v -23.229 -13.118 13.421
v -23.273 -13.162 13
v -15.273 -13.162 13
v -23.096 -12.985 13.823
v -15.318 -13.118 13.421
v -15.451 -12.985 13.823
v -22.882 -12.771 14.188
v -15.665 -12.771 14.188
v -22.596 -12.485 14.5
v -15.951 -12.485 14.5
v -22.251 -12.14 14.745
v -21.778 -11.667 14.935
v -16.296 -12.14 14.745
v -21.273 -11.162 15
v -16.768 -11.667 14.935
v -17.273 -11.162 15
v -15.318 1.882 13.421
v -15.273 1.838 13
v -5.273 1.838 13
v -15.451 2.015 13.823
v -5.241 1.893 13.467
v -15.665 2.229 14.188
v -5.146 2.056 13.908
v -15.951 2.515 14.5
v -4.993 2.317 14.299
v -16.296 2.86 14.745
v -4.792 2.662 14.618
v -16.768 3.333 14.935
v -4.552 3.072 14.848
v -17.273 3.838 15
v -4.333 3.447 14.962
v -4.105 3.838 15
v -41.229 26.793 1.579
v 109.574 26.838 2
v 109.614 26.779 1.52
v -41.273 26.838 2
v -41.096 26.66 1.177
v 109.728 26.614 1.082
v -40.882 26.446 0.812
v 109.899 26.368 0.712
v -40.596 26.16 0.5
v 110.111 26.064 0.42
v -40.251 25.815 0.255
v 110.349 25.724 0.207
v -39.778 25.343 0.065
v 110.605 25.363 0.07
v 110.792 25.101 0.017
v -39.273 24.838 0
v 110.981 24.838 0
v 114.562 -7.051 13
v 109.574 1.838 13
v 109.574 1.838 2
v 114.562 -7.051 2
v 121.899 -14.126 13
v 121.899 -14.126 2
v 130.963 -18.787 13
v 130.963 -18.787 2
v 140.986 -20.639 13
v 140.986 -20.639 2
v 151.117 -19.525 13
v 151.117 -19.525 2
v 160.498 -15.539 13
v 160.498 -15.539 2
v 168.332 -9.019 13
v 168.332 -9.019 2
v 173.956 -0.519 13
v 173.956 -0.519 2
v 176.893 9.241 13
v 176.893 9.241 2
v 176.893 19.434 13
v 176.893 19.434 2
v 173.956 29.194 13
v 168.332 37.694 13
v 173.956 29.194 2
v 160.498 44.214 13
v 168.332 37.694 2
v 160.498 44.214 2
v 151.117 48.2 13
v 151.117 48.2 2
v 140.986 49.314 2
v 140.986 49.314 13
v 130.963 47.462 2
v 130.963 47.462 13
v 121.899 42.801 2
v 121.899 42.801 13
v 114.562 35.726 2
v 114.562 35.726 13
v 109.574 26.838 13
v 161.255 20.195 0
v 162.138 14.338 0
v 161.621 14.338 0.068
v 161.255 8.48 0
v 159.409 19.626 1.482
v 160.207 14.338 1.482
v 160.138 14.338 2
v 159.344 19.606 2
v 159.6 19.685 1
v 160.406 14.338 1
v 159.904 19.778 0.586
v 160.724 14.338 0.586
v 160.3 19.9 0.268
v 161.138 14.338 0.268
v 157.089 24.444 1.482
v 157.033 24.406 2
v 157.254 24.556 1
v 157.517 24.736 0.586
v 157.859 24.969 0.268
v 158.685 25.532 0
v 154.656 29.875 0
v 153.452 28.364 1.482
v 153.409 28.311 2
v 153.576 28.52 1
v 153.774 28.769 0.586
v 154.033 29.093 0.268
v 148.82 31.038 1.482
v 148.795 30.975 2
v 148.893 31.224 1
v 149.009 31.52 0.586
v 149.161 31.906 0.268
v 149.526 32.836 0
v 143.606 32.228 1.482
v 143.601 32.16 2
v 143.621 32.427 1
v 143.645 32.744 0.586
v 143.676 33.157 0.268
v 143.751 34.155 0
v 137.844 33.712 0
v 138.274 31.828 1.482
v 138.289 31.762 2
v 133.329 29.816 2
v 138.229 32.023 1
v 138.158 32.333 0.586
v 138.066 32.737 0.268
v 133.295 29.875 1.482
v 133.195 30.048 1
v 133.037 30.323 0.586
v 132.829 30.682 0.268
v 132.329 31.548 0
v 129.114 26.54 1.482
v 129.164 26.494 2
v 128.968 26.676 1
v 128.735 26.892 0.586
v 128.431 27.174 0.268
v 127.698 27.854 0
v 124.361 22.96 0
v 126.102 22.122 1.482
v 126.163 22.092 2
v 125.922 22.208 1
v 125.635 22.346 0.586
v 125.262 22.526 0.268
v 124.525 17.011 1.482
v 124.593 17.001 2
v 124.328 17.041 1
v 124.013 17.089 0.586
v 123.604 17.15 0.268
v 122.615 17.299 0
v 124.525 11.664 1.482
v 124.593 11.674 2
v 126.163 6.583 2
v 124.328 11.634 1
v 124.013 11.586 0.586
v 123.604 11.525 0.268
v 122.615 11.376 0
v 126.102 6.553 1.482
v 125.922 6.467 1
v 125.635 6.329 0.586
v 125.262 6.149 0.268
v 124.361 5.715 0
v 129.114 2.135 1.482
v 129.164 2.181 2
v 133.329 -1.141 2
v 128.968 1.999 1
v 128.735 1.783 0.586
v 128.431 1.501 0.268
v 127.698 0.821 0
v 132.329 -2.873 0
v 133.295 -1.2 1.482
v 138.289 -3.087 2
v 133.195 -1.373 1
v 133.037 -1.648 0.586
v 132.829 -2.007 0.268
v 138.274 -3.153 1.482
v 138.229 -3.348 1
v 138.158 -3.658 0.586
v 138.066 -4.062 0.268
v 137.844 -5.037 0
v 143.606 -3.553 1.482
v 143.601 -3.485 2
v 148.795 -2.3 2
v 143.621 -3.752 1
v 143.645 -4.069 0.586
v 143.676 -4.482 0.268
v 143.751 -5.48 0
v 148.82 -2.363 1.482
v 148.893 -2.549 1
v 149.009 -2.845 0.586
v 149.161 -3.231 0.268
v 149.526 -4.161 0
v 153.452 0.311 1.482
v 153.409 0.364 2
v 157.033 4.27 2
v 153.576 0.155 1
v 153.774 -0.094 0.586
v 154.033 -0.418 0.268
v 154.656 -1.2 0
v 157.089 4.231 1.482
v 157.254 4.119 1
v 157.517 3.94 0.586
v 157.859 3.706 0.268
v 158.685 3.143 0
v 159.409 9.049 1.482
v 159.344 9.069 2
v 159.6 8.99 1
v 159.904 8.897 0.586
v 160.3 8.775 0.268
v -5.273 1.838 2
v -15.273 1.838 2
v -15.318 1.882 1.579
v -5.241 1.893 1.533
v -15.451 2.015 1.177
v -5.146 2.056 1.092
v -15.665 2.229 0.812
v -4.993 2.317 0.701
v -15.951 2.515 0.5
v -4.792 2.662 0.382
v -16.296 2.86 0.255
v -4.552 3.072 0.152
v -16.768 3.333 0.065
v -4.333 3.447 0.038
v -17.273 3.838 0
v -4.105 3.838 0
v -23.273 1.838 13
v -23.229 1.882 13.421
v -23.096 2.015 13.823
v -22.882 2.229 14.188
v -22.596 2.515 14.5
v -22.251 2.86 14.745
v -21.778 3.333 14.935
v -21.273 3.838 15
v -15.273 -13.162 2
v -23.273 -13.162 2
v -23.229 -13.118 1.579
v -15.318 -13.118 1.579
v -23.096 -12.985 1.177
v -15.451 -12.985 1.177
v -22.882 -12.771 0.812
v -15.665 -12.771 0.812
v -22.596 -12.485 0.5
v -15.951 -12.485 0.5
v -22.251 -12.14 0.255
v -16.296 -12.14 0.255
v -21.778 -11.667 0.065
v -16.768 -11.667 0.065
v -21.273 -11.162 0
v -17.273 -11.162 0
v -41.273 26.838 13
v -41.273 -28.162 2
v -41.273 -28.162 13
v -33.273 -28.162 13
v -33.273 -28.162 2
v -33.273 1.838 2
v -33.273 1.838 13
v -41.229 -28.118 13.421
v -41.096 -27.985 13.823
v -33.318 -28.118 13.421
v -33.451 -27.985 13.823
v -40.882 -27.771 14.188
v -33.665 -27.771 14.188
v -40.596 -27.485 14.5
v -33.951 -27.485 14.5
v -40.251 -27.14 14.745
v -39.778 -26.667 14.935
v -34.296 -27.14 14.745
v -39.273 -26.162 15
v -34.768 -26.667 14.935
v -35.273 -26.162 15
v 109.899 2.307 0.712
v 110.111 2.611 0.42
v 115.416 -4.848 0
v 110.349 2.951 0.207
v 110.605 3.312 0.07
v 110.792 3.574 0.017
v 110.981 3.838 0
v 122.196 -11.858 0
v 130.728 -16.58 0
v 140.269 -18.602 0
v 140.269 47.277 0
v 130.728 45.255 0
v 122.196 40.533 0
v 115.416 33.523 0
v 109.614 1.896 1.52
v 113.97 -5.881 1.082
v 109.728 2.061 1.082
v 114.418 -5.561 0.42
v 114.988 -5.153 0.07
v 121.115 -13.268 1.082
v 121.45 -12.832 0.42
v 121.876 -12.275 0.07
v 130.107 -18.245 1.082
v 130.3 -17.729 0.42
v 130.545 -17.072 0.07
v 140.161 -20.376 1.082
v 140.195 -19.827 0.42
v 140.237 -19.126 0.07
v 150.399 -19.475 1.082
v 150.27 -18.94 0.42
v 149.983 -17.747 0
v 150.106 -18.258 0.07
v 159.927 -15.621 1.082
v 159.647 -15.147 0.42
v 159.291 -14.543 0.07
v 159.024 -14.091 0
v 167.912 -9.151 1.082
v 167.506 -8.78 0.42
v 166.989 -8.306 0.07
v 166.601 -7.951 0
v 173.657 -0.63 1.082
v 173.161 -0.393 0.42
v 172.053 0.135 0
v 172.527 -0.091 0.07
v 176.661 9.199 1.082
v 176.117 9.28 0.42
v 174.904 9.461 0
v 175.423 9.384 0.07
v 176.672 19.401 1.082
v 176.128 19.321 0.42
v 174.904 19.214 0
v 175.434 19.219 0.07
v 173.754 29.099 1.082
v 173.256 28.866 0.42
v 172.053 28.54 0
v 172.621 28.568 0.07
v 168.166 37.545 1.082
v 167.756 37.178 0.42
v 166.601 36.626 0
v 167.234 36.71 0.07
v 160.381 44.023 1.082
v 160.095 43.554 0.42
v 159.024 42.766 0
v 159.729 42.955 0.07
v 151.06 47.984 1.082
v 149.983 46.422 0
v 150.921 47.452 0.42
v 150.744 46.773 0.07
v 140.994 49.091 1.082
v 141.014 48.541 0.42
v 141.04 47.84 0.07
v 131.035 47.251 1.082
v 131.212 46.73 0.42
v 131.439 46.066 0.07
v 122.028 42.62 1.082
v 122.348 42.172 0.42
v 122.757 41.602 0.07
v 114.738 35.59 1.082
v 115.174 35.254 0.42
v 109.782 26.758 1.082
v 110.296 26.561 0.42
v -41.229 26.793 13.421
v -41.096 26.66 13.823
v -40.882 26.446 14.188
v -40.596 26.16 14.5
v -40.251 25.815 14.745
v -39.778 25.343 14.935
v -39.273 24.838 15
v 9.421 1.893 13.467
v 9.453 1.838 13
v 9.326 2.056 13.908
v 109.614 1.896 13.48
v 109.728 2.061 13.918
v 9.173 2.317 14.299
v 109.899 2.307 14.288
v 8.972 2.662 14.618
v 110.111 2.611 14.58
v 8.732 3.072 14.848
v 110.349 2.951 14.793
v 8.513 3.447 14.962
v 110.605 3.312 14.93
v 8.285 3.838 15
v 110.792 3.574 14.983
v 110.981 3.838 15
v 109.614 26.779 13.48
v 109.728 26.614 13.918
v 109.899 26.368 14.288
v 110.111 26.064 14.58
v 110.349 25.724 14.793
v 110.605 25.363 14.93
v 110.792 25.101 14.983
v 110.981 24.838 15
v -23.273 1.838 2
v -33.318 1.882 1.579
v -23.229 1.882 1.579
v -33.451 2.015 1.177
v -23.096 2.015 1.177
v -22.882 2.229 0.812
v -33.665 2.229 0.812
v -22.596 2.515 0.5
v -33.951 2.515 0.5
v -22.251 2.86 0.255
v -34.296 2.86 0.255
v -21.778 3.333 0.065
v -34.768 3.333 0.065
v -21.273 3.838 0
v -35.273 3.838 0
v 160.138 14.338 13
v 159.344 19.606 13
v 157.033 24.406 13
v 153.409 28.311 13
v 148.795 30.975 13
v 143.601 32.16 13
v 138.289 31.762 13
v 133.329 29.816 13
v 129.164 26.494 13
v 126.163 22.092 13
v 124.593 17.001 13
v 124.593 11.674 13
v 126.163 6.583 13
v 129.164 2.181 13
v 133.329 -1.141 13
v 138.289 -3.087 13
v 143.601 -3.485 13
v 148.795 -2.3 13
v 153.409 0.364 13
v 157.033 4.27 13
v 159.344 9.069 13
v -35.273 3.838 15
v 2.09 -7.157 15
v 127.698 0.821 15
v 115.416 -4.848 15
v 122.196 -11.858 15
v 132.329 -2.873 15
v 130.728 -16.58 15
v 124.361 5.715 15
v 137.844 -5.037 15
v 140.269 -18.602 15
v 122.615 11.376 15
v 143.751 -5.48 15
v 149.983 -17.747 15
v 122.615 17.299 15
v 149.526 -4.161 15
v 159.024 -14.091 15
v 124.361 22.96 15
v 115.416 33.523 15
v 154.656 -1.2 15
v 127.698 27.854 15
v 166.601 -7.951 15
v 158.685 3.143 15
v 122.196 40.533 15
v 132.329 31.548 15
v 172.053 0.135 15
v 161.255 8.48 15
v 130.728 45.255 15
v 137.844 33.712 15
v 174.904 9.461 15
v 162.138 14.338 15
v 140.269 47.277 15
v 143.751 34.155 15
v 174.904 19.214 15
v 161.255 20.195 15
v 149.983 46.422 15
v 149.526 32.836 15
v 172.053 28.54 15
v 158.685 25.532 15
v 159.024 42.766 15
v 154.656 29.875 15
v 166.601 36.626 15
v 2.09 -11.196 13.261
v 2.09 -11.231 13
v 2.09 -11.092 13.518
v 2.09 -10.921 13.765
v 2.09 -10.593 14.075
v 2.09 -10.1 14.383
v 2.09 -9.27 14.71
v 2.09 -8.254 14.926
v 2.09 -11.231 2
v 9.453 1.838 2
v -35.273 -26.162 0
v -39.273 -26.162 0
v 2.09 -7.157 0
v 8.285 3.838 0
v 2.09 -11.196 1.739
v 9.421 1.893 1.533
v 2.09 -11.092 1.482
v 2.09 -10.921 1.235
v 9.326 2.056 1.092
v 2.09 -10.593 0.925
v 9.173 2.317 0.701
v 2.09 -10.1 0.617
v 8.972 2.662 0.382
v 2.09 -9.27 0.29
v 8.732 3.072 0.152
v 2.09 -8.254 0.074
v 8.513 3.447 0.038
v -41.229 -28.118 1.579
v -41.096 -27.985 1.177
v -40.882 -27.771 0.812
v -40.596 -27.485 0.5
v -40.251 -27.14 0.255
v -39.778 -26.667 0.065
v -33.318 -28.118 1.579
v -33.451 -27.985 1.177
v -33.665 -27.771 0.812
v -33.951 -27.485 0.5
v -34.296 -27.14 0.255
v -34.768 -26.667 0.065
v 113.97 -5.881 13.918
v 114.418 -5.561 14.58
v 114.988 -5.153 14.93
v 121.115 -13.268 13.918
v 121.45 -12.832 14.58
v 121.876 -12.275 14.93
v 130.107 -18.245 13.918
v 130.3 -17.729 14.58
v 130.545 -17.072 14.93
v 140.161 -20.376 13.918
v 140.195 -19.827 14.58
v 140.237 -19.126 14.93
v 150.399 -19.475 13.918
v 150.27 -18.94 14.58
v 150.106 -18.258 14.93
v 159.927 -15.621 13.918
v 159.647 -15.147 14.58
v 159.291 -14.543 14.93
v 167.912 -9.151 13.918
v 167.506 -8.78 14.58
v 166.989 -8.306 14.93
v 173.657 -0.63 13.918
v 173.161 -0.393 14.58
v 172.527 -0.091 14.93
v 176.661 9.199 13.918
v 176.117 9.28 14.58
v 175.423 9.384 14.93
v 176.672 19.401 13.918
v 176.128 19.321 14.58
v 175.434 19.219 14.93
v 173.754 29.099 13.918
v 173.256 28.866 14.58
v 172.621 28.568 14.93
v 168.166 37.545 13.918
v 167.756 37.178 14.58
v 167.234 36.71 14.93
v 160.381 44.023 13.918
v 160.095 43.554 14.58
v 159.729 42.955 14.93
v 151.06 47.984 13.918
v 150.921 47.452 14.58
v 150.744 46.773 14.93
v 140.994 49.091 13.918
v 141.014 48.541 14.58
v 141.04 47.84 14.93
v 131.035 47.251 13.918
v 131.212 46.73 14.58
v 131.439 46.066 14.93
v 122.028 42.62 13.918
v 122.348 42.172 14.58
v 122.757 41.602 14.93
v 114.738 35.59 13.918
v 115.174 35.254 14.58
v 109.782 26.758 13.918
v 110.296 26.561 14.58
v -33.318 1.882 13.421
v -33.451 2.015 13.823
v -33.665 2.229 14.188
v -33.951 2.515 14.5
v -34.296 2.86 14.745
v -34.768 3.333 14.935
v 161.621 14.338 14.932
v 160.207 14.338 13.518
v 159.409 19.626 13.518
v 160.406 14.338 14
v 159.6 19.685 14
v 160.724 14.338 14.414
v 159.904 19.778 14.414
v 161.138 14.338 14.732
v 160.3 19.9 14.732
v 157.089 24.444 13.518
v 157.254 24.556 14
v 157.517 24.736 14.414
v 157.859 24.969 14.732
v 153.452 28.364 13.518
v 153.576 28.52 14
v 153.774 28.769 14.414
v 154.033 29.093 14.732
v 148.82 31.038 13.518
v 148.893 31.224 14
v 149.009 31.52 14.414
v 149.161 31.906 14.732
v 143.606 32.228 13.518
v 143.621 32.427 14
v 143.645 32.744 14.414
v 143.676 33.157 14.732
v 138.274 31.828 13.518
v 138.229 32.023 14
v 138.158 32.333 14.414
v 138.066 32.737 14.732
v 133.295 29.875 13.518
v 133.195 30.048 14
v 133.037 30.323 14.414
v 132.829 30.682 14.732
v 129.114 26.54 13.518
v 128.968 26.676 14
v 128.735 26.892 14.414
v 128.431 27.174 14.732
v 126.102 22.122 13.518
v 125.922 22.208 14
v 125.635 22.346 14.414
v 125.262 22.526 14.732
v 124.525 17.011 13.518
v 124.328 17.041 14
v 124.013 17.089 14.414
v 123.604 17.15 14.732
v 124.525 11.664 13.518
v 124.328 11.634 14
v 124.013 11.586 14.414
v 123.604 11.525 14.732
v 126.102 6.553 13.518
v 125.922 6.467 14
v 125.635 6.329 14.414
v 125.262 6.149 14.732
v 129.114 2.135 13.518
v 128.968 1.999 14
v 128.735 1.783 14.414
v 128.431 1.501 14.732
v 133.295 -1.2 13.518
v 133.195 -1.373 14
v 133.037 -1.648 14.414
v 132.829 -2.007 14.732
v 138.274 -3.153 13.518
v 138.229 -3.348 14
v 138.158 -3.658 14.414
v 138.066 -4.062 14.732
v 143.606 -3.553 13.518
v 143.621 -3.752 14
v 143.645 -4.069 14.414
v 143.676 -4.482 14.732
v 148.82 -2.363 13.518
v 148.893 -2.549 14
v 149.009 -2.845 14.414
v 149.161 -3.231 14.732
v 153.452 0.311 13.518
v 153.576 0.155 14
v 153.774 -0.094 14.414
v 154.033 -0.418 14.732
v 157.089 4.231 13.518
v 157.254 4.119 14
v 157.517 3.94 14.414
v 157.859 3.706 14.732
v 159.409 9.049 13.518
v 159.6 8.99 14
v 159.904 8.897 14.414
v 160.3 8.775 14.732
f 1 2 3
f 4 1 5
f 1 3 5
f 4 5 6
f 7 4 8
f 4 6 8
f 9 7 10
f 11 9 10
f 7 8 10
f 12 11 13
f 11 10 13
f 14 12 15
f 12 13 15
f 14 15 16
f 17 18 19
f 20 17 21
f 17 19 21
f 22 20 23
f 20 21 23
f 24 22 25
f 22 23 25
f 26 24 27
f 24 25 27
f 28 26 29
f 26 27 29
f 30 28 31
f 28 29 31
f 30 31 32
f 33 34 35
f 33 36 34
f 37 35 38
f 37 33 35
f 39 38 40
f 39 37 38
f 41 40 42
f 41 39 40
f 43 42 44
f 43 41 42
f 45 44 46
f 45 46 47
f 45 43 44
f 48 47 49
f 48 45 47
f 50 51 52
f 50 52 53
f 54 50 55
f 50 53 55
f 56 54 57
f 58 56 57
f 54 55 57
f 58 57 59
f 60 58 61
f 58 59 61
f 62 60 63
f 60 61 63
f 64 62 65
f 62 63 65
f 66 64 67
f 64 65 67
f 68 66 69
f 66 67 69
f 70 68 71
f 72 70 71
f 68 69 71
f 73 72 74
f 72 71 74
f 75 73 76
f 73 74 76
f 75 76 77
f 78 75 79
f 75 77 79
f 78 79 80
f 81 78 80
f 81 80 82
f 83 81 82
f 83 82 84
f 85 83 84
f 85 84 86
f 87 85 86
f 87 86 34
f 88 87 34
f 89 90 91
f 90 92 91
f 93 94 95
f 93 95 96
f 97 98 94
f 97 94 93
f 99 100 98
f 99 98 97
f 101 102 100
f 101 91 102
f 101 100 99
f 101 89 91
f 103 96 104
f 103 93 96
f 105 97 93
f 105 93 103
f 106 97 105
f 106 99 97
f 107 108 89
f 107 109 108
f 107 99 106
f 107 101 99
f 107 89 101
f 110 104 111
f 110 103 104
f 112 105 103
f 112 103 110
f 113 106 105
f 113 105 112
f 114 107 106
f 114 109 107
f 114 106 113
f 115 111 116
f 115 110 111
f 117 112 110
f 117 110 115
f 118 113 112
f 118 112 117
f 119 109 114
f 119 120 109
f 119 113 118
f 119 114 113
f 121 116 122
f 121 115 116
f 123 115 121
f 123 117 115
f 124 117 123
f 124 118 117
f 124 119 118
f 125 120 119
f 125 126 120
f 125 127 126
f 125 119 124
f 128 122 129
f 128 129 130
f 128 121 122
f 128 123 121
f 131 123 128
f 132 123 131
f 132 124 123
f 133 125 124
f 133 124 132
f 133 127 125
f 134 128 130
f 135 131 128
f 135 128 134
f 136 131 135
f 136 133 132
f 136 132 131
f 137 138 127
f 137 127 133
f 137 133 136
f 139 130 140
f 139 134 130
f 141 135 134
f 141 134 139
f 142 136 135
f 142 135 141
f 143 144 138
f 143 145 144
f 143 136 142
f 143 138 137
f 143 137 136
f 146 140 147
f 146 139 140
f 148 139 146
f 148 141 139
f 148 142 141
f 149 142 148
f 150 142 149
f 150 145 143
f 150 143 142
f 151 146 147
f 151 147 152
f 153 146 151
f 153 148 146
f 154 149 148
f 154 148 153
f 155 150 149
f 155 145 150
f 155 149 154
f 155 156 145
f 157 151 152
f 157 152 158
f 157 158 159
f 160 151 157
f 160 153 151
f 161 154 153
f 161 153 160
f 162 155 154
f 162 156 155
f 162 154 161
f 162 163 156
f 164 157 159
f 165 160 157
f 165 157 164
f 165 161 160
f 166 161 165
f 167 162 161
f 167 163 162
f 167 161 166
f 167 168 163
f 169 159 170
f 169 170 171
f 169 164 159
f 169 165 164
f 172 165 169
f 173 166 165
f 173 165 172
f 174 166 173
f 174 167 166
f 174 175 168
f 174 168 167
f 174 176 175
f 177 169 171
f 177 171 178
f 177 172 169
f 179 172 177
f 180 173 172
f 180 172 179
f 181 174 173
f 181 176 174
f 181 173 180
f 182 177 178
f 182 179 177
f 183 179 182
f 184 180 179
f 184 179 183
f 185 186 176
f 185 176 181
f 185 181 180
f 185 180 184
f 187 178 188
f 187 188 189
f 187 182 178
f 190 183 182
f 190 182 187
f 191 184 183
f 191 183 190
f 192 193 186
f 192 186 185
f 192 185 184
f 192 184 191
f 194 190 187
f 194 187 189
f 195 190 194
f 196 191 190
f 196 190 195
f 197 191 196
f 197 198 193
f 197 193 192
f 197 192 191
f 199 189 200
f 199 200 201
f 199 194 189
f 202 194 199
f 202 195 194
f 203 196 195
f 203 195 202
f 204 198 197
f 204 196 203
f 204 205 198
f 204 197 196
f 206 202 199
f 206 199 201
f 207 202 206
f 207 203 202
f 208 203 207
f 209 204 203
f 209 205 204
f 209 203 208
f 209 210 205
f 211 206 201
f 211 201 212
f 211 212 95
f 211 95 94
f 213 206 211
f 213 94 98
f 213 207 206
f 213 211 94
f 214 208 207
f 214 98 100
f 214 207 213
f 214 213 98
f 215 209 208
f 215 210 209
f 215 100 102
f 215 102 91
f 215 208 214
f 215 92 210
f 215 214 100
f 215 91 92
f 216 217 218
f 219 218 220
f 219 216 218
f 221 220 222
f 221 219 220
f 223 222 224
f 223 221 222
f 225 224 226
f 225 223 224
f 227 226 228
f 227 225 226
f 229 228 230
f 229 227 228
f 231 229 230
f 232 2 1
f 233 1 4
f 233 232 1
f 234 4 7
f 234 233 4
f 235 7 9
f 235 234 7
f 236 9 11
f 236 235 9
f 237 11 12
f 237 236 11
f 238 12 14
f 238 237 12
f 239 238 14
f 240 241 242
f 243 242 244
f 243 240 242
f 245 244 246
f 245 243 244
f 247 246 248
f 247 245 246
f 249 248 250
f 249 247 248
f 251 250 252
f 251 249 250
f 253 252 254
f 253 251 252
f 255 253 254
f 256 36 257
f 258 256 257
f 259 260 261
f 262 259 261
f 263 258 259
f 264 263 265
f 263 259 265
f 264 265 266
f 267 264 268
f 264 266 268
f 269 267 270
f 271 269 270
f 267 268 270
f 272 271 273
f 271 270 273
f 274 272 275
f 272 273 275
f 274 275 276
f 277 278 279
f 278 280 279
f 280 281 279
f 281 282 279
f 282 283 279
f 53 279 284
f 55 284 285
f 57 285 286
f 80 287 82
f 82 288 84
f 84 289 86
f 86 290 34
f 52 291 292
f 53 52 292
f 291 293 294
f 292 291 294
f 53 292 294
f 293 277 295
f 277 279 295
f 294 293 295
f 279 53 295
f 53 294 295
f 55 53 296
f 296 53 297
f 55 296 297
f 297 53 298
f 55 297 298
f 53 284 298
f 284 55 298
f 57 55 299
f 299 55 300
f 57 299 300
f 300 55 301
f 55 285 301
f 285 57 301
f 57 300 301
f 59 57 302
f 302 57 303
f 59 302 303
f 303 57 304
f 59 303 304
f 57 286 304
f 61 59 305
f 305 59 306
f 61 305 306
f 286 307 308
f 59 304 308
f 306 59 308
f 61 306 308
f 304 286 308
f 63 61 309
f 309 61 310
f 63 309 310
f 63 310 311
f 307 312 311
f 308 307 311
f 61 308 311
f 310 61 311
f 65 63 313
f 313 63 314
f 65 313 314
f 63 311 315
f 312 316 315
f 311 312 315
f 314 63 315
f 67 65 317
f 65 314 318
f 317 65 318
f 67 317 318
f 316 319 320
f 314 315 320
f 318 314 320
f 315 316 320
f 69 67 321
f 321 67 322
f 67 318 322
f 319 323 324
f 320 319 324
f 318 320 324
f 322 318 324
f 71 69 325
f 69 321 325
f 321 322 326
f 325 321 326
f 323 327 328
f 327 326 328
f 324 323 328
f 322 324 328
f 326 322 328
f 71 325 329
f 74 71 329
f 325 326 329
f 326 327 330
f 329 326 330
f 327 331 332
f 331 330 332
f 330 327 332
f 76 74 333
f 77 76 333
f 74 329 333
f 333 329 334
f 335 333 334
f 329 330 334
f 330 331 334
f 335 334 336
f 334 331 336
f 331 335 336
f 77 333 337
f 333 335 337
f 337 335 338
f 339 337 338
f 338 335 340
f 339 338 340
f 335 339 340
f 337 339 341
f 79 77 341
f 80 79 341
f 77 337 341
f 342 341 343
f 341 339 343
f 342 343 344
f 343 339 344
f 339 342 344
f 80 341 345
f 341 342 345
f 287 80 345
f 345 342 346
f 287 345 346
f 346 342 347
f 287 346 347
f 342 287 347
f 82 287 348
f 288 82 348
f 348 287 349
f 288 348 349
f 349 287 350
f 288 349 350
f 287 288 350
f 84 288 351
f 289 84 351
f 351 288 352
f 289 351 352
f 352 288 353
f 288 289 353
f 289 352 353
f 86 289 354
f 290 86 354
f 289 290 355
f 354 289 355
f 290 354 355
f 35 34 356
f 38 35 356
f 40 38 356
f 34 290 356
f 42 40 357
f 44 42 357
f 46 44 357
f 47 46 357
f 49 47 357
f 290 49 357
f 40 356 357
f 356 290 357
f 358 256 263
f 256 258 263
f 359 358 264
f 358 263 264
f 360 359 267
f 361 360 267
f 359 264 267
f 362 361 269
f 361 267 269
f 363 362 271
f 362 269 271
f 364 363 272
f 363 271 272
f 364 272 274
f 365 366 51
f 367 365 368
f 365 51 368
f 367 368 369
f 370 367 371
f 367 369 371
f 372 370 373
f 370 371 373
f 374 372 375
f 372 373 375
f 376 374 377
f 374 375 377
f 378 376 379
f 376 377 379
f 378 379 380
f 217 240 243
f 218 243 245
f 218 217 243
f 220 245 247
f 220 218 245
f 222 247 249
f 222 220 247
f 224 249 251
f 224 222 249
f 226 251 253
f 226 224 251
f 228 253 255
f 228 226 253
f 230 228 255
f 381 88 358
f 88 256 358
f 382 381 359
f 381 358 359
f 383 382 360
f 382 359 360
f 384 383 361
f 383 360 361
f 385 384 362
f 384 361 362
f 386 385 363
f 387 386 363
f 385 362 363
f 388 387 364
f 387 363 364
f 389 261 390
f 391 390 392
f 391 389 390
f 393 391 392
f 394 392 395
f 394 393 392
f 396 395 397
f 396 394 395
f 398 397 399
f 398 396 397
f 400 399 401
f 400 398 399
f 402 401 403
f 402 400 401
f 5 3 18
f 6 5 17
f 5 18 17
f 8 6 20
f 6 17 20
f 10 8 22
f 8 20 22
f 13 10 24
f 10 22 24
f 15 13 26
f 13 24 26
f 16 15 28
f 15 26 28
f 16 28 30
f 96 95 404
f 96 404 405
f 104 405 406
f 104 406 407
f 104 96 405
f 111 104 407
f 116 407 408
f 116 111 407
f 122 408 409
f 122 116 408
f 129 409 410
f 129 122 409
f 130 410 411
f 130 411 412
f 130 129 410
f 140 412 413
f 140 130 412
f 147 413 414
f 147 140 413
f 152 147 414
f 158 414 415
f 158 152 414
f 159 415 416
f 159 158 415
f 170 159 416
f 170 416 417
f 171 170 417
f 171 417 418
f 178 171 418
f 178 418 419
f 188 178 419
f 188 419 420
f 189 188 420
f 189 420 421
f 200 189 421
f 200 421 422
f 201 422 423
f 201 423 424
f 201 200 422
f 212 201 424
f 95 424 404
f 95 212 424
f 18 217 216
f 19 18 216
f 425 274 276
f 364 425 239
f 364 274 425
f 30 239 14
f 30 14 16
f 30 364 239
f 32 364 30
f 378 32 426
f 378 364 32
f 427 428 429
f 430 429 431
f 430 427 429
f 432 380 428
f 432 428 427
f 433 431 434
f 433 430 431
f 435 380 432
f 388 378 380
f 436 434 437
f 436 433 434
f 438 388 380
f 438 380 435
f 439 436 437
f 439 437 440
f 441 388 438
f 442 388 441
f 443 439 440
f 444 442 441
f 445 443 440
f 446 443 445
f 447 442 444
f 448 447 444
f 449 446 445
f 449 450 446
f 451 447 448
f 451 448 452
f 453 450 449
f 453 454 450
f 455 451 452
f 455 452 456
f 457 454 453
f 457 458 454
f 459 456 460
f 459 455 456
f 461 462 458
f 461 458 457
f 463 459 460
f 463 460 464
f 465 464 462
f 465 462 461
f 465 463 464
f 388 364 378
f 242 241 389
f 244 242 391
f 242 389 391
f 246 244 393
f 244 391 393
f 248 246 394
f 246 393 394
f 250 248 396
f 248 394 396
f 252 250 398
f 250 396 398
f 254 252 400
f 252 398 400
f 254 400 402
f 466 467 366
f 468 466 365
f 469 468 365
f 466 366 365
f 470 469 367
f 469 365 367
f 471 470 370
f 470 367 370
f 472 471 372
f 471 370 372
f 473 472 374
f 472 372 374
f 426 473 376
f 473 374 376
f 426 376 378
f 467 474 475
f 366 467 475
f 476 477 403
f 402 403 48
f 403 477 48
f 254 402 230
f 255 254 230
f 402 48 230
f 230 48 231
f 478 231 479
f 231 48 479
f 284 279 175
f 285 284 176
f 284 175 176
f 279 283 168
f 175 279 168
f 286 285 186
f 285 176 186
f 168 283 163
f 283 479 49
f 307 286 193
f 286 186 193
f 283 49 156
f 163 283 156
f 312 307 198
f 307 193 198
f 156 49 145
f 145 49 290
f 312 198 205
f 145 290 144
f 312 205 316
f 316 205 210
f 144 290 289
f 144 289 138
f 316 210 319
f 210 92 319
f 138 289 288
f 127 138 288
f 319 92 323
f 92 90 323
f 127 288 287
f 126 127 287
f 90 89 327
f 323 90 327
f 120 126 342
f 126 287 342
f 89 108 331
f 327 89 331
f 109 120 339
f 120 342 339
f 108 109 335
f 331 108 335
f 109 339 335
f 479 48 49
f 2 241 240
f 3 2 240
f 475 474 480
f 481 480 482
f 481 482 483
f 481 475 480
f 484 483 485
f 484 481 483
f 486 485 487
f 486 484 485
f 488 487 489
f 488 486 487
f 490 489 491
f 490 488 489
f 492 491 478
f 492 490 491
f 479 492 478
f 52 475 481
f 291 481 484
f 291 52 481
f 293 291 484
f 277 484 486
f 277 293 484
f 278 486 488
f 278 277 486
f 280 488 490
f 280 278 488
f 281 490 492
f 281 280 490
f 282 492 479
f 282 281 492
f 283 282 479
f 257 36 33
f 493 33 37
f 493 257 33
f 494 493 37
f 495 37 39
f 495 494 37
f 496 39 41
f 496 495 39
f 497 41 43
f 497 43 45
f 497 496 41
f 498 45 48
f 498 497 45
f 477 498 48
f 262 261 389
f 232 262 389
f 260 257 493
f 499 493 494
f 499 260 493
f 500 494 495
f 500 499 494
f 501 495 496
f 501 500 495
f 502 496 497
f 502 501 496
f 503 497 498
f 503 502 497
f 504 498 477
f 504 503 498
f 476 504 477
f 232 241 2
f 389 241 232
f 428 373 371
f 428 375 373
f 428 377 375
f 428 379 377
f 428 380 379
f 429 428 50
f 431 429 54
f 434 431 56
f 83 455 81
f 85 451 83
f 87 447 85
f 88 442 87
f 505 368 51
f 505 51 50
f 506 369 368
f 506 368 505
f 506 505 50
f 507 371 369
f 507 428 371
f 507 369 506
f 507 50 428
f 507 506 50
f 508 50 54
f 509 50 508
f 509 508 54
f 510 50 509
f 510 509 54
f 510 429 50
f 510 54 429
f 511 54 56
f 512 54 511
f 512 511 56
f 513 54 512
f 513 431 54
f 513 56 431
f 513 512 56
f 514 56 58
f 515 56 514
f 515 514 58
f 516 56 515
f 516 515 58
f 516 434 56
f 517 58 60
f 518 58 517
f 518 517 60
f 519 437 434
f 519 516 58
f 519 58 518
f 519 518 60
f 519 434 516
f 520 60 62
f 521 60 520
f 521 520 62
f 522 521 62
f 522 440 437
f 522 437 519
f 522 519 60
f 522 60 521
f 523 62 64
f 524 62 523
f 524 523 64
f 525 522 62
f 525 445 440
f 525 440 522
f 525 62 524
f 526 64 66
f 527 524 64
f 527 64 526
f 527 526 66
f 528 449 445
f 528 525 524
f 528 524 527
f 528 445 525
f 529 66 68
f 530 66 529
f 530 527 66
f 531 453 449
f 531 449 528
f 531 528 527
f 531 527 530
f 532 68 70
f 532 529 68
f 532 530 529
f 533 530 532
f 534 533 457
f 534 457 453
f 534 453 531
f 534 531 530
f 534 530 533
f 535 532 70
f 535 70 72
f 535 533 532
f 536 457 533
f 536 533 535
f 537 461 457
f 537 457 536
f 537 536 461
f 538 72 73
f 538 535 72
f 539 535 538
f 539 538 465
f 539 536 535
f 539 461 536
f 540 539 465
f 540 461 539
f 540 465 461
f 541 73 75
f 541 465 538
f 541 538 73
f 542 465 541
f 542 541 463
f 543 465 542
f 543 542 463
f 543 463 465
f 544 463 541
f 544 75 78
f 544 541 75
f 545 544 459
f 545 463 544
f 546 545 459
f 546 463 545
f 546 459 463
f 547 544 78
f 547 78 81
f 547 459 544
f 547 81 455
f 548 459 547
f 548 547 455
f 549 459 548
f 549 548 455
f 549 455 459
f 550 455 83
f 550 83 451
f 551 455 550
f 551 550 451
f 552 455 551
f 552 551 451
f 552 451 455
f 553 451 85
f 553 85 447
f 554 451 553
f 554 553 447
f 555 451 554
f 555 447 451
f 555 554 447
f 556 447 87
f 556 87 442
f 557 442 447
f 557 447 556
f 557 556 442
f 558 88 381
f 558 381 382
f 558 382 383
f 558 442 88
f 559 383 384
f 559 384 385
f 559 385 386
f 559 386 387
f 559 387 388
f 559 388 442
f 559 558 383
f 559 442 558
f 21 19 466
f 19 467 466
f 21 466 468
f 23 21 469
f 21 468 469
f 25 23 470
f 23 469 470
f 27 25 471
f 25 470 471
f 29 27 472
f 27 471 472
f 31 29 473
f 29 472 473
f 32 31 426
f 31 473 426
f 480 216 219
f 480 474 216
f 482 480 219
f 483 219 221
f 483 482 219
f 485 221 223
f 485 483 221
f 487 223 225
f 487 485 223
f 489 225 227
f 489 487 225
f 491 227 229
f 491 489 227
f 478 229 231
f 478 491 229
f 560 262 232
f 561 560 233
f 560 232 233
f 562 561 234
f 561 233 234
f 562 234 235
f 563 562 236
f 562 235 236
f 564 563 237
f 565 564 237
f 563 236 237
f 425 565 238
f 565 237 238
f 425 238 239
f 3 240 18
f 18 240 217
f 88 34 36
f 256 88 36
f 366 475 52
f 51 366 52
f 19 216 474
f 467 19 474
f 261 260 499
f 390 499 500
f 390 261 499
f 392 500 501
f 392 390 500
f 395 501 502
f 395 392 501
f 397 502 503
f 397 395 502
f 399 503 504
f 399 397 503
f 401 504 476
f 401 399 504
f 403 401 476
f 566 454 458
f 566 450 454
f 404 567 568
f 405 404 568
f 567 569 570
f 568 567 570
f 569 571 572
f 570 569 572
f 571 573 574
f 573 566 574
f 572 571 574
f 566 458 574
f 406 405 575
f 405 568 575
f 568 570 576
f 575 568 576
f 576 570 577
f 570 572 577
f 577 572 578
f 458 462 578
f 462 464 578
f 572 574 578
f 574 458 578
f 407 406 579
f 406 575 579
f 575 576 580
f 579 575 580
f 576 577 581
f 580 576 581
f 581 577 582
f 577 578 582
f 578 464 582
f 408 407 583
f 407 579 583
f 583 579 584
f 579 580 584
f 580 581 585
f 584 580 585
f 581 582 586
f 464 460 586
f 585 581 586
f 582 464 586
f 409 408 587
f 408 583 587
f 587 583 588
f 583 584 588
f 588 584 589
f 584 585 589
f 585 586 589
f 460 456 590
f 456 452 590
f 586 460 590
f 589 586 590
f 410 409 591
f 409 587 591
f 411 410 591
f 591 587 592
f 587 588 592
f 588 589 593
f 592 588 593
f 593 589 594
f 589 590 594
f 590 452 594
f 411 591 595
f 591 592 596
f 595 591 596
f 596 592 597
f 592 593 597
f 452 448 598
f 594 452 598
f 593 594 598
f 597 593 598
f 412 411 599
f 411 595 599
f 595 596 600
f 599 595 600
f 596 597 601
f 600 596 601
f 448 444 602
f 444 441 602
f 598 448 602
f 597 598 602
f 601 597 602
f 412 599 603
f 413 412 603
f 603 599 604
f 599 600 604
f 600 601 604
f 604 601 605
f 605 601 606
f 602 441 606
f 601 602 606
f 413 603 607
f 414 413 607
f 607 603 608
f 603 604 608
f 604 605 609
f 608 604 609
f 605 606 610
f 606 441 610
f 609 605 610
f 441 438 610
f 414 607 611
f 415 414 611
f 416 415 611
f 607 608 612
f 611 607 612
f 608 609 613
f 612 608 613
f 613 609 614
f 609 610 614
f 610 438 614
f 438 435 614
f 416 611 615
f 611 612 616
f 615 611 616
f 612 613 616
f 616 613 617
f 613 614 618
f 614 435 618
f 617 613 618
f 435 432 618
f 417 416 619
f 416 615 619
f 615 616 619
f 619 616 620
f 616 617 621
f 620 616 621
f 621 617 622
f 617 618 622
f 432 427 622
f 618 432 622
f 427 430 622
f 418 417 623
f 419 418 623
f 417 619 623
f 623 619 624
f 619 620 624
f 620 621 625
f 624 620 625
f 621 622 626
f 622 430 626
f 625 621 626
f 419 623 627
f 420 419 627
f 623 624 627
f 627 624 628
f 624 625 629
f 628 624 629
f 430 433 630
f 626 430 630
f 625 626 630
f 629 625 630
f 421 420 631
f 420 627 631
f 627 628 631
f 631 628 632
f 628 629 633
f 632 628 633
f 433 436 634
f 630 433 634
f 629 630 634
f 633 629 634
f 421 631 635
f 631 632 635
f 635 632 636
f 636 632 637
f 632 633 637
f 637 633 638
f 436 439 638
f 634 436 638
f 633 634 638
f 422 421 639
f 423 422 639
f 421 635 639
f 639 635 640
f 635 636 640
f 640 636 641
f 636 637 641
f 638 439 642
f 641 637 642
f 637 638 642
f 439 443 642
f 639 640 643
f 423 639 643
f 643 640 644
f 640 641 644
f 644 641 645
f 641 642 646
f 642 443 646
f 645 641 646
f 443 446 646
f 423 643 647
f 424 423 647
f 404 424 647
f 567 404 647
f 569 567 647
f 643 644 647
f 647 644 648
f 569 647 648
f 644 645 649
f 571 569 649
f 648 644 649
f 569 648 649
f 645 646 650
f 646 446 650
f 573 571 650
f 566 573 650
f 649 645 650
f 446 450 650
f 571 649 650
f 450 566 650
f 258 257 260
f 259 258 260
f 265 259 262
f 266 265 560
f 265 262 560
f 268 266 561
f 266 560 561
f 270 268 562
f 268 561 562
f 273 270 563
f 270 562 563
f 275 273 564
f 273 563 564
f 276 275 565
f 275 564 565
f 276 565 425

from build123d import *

# Parameters (mm, degrees)
F0_W     = 8
F0_H     = 30
F0_H_2   = 15
F0_R     = 17.872641
F1_DEPTH = 15
F2_R     = 2


with BuildPart() as f1:
    # F0 (on Top) → F1 (new body)
    with BuildSketch(Plane.XY):
        Polygon((2.090012, -11.230736), (9.453485, 1.837518), (-5.27346, 1.837518), align=None)
        with Locations((-37.27346, -13.162482)):
            Rectangle(F0_W, F0_H)
        with Locations((-19.27346, -5.662482)):
            Rectangle(F0_W, F0_H_2)
        with BuildLine():
            ThreePointArc((109.573999, 1.837518), (177.265741, 14.337518), (109.573999, 26.837518))
            Line((109.573999, 26.837518), (109.573999, 1.837518))
        make_face()
        with Locations((142.265741, 14.337518)):
            Circle(F0_R, mode=Mode.SUBTRACT)
        Polygon((109.573999, 26.837518), (-41.27346, 26.837518), (-41.27346, 1.837518), (-33.27346, 1.837518), (-23.27346, 1.837518), (-15.27346, 1.837518), (-5.27346, 1.837518), (9.453485, 1.837518), (109.573999, 1.837518), align=None)
    extrude(amount=F1_DEPTH)

    # F2
    f2_edges = [f1.edges().sort_by_distance(p)[0] for p in [
        (-41.27346, -0.662482, 15),
        (-37.27346, -28.162482, 15),
        (-33.27346, -13.162482, 15),
        (-28.27346, 1.837518, 15),
        (-23.27346, -5.662482, 15),
        (-19.27346, -13.162482, 15),
        (-15.27346, -5.662482, 15),
        (-10.27346, 1.837518, 15),
        (-1.591724, -4.696609, 15),
        (5.771749, -4.696609, 15),
        (59.513742, 1.837518, 15),
        (177.265741, 14.337518, 15),
        (34.150269, 26.837518, 15),
        (124.3931, 14.337518, 15),
        (-37.27346, -28.162482, 0),
        (-33.27346, -13.162482, 0),
        (-28.27346, 1.837518, 0),
        (-23.27346, -5.662482, 0),
        (-19.27346, -13.162482, 0),
        (-15.27346, -5.662482, 0),
        (-10.27346, 1.837518, 0),
        (-1.591724, -4.696609, 0),
        (5.771749, -4.696609, 0),
        (59.513742, 1.837518, 0),
        (177.265741, 14.337518, 0),
        (34.150269, 26.837518, 0),
        (-41.27346, -0.662482, 0),
        (124.3931, 14.337518, 0),
    ]]
    fillet(f2_edges, radius=F2_R)


solid = f1.part
